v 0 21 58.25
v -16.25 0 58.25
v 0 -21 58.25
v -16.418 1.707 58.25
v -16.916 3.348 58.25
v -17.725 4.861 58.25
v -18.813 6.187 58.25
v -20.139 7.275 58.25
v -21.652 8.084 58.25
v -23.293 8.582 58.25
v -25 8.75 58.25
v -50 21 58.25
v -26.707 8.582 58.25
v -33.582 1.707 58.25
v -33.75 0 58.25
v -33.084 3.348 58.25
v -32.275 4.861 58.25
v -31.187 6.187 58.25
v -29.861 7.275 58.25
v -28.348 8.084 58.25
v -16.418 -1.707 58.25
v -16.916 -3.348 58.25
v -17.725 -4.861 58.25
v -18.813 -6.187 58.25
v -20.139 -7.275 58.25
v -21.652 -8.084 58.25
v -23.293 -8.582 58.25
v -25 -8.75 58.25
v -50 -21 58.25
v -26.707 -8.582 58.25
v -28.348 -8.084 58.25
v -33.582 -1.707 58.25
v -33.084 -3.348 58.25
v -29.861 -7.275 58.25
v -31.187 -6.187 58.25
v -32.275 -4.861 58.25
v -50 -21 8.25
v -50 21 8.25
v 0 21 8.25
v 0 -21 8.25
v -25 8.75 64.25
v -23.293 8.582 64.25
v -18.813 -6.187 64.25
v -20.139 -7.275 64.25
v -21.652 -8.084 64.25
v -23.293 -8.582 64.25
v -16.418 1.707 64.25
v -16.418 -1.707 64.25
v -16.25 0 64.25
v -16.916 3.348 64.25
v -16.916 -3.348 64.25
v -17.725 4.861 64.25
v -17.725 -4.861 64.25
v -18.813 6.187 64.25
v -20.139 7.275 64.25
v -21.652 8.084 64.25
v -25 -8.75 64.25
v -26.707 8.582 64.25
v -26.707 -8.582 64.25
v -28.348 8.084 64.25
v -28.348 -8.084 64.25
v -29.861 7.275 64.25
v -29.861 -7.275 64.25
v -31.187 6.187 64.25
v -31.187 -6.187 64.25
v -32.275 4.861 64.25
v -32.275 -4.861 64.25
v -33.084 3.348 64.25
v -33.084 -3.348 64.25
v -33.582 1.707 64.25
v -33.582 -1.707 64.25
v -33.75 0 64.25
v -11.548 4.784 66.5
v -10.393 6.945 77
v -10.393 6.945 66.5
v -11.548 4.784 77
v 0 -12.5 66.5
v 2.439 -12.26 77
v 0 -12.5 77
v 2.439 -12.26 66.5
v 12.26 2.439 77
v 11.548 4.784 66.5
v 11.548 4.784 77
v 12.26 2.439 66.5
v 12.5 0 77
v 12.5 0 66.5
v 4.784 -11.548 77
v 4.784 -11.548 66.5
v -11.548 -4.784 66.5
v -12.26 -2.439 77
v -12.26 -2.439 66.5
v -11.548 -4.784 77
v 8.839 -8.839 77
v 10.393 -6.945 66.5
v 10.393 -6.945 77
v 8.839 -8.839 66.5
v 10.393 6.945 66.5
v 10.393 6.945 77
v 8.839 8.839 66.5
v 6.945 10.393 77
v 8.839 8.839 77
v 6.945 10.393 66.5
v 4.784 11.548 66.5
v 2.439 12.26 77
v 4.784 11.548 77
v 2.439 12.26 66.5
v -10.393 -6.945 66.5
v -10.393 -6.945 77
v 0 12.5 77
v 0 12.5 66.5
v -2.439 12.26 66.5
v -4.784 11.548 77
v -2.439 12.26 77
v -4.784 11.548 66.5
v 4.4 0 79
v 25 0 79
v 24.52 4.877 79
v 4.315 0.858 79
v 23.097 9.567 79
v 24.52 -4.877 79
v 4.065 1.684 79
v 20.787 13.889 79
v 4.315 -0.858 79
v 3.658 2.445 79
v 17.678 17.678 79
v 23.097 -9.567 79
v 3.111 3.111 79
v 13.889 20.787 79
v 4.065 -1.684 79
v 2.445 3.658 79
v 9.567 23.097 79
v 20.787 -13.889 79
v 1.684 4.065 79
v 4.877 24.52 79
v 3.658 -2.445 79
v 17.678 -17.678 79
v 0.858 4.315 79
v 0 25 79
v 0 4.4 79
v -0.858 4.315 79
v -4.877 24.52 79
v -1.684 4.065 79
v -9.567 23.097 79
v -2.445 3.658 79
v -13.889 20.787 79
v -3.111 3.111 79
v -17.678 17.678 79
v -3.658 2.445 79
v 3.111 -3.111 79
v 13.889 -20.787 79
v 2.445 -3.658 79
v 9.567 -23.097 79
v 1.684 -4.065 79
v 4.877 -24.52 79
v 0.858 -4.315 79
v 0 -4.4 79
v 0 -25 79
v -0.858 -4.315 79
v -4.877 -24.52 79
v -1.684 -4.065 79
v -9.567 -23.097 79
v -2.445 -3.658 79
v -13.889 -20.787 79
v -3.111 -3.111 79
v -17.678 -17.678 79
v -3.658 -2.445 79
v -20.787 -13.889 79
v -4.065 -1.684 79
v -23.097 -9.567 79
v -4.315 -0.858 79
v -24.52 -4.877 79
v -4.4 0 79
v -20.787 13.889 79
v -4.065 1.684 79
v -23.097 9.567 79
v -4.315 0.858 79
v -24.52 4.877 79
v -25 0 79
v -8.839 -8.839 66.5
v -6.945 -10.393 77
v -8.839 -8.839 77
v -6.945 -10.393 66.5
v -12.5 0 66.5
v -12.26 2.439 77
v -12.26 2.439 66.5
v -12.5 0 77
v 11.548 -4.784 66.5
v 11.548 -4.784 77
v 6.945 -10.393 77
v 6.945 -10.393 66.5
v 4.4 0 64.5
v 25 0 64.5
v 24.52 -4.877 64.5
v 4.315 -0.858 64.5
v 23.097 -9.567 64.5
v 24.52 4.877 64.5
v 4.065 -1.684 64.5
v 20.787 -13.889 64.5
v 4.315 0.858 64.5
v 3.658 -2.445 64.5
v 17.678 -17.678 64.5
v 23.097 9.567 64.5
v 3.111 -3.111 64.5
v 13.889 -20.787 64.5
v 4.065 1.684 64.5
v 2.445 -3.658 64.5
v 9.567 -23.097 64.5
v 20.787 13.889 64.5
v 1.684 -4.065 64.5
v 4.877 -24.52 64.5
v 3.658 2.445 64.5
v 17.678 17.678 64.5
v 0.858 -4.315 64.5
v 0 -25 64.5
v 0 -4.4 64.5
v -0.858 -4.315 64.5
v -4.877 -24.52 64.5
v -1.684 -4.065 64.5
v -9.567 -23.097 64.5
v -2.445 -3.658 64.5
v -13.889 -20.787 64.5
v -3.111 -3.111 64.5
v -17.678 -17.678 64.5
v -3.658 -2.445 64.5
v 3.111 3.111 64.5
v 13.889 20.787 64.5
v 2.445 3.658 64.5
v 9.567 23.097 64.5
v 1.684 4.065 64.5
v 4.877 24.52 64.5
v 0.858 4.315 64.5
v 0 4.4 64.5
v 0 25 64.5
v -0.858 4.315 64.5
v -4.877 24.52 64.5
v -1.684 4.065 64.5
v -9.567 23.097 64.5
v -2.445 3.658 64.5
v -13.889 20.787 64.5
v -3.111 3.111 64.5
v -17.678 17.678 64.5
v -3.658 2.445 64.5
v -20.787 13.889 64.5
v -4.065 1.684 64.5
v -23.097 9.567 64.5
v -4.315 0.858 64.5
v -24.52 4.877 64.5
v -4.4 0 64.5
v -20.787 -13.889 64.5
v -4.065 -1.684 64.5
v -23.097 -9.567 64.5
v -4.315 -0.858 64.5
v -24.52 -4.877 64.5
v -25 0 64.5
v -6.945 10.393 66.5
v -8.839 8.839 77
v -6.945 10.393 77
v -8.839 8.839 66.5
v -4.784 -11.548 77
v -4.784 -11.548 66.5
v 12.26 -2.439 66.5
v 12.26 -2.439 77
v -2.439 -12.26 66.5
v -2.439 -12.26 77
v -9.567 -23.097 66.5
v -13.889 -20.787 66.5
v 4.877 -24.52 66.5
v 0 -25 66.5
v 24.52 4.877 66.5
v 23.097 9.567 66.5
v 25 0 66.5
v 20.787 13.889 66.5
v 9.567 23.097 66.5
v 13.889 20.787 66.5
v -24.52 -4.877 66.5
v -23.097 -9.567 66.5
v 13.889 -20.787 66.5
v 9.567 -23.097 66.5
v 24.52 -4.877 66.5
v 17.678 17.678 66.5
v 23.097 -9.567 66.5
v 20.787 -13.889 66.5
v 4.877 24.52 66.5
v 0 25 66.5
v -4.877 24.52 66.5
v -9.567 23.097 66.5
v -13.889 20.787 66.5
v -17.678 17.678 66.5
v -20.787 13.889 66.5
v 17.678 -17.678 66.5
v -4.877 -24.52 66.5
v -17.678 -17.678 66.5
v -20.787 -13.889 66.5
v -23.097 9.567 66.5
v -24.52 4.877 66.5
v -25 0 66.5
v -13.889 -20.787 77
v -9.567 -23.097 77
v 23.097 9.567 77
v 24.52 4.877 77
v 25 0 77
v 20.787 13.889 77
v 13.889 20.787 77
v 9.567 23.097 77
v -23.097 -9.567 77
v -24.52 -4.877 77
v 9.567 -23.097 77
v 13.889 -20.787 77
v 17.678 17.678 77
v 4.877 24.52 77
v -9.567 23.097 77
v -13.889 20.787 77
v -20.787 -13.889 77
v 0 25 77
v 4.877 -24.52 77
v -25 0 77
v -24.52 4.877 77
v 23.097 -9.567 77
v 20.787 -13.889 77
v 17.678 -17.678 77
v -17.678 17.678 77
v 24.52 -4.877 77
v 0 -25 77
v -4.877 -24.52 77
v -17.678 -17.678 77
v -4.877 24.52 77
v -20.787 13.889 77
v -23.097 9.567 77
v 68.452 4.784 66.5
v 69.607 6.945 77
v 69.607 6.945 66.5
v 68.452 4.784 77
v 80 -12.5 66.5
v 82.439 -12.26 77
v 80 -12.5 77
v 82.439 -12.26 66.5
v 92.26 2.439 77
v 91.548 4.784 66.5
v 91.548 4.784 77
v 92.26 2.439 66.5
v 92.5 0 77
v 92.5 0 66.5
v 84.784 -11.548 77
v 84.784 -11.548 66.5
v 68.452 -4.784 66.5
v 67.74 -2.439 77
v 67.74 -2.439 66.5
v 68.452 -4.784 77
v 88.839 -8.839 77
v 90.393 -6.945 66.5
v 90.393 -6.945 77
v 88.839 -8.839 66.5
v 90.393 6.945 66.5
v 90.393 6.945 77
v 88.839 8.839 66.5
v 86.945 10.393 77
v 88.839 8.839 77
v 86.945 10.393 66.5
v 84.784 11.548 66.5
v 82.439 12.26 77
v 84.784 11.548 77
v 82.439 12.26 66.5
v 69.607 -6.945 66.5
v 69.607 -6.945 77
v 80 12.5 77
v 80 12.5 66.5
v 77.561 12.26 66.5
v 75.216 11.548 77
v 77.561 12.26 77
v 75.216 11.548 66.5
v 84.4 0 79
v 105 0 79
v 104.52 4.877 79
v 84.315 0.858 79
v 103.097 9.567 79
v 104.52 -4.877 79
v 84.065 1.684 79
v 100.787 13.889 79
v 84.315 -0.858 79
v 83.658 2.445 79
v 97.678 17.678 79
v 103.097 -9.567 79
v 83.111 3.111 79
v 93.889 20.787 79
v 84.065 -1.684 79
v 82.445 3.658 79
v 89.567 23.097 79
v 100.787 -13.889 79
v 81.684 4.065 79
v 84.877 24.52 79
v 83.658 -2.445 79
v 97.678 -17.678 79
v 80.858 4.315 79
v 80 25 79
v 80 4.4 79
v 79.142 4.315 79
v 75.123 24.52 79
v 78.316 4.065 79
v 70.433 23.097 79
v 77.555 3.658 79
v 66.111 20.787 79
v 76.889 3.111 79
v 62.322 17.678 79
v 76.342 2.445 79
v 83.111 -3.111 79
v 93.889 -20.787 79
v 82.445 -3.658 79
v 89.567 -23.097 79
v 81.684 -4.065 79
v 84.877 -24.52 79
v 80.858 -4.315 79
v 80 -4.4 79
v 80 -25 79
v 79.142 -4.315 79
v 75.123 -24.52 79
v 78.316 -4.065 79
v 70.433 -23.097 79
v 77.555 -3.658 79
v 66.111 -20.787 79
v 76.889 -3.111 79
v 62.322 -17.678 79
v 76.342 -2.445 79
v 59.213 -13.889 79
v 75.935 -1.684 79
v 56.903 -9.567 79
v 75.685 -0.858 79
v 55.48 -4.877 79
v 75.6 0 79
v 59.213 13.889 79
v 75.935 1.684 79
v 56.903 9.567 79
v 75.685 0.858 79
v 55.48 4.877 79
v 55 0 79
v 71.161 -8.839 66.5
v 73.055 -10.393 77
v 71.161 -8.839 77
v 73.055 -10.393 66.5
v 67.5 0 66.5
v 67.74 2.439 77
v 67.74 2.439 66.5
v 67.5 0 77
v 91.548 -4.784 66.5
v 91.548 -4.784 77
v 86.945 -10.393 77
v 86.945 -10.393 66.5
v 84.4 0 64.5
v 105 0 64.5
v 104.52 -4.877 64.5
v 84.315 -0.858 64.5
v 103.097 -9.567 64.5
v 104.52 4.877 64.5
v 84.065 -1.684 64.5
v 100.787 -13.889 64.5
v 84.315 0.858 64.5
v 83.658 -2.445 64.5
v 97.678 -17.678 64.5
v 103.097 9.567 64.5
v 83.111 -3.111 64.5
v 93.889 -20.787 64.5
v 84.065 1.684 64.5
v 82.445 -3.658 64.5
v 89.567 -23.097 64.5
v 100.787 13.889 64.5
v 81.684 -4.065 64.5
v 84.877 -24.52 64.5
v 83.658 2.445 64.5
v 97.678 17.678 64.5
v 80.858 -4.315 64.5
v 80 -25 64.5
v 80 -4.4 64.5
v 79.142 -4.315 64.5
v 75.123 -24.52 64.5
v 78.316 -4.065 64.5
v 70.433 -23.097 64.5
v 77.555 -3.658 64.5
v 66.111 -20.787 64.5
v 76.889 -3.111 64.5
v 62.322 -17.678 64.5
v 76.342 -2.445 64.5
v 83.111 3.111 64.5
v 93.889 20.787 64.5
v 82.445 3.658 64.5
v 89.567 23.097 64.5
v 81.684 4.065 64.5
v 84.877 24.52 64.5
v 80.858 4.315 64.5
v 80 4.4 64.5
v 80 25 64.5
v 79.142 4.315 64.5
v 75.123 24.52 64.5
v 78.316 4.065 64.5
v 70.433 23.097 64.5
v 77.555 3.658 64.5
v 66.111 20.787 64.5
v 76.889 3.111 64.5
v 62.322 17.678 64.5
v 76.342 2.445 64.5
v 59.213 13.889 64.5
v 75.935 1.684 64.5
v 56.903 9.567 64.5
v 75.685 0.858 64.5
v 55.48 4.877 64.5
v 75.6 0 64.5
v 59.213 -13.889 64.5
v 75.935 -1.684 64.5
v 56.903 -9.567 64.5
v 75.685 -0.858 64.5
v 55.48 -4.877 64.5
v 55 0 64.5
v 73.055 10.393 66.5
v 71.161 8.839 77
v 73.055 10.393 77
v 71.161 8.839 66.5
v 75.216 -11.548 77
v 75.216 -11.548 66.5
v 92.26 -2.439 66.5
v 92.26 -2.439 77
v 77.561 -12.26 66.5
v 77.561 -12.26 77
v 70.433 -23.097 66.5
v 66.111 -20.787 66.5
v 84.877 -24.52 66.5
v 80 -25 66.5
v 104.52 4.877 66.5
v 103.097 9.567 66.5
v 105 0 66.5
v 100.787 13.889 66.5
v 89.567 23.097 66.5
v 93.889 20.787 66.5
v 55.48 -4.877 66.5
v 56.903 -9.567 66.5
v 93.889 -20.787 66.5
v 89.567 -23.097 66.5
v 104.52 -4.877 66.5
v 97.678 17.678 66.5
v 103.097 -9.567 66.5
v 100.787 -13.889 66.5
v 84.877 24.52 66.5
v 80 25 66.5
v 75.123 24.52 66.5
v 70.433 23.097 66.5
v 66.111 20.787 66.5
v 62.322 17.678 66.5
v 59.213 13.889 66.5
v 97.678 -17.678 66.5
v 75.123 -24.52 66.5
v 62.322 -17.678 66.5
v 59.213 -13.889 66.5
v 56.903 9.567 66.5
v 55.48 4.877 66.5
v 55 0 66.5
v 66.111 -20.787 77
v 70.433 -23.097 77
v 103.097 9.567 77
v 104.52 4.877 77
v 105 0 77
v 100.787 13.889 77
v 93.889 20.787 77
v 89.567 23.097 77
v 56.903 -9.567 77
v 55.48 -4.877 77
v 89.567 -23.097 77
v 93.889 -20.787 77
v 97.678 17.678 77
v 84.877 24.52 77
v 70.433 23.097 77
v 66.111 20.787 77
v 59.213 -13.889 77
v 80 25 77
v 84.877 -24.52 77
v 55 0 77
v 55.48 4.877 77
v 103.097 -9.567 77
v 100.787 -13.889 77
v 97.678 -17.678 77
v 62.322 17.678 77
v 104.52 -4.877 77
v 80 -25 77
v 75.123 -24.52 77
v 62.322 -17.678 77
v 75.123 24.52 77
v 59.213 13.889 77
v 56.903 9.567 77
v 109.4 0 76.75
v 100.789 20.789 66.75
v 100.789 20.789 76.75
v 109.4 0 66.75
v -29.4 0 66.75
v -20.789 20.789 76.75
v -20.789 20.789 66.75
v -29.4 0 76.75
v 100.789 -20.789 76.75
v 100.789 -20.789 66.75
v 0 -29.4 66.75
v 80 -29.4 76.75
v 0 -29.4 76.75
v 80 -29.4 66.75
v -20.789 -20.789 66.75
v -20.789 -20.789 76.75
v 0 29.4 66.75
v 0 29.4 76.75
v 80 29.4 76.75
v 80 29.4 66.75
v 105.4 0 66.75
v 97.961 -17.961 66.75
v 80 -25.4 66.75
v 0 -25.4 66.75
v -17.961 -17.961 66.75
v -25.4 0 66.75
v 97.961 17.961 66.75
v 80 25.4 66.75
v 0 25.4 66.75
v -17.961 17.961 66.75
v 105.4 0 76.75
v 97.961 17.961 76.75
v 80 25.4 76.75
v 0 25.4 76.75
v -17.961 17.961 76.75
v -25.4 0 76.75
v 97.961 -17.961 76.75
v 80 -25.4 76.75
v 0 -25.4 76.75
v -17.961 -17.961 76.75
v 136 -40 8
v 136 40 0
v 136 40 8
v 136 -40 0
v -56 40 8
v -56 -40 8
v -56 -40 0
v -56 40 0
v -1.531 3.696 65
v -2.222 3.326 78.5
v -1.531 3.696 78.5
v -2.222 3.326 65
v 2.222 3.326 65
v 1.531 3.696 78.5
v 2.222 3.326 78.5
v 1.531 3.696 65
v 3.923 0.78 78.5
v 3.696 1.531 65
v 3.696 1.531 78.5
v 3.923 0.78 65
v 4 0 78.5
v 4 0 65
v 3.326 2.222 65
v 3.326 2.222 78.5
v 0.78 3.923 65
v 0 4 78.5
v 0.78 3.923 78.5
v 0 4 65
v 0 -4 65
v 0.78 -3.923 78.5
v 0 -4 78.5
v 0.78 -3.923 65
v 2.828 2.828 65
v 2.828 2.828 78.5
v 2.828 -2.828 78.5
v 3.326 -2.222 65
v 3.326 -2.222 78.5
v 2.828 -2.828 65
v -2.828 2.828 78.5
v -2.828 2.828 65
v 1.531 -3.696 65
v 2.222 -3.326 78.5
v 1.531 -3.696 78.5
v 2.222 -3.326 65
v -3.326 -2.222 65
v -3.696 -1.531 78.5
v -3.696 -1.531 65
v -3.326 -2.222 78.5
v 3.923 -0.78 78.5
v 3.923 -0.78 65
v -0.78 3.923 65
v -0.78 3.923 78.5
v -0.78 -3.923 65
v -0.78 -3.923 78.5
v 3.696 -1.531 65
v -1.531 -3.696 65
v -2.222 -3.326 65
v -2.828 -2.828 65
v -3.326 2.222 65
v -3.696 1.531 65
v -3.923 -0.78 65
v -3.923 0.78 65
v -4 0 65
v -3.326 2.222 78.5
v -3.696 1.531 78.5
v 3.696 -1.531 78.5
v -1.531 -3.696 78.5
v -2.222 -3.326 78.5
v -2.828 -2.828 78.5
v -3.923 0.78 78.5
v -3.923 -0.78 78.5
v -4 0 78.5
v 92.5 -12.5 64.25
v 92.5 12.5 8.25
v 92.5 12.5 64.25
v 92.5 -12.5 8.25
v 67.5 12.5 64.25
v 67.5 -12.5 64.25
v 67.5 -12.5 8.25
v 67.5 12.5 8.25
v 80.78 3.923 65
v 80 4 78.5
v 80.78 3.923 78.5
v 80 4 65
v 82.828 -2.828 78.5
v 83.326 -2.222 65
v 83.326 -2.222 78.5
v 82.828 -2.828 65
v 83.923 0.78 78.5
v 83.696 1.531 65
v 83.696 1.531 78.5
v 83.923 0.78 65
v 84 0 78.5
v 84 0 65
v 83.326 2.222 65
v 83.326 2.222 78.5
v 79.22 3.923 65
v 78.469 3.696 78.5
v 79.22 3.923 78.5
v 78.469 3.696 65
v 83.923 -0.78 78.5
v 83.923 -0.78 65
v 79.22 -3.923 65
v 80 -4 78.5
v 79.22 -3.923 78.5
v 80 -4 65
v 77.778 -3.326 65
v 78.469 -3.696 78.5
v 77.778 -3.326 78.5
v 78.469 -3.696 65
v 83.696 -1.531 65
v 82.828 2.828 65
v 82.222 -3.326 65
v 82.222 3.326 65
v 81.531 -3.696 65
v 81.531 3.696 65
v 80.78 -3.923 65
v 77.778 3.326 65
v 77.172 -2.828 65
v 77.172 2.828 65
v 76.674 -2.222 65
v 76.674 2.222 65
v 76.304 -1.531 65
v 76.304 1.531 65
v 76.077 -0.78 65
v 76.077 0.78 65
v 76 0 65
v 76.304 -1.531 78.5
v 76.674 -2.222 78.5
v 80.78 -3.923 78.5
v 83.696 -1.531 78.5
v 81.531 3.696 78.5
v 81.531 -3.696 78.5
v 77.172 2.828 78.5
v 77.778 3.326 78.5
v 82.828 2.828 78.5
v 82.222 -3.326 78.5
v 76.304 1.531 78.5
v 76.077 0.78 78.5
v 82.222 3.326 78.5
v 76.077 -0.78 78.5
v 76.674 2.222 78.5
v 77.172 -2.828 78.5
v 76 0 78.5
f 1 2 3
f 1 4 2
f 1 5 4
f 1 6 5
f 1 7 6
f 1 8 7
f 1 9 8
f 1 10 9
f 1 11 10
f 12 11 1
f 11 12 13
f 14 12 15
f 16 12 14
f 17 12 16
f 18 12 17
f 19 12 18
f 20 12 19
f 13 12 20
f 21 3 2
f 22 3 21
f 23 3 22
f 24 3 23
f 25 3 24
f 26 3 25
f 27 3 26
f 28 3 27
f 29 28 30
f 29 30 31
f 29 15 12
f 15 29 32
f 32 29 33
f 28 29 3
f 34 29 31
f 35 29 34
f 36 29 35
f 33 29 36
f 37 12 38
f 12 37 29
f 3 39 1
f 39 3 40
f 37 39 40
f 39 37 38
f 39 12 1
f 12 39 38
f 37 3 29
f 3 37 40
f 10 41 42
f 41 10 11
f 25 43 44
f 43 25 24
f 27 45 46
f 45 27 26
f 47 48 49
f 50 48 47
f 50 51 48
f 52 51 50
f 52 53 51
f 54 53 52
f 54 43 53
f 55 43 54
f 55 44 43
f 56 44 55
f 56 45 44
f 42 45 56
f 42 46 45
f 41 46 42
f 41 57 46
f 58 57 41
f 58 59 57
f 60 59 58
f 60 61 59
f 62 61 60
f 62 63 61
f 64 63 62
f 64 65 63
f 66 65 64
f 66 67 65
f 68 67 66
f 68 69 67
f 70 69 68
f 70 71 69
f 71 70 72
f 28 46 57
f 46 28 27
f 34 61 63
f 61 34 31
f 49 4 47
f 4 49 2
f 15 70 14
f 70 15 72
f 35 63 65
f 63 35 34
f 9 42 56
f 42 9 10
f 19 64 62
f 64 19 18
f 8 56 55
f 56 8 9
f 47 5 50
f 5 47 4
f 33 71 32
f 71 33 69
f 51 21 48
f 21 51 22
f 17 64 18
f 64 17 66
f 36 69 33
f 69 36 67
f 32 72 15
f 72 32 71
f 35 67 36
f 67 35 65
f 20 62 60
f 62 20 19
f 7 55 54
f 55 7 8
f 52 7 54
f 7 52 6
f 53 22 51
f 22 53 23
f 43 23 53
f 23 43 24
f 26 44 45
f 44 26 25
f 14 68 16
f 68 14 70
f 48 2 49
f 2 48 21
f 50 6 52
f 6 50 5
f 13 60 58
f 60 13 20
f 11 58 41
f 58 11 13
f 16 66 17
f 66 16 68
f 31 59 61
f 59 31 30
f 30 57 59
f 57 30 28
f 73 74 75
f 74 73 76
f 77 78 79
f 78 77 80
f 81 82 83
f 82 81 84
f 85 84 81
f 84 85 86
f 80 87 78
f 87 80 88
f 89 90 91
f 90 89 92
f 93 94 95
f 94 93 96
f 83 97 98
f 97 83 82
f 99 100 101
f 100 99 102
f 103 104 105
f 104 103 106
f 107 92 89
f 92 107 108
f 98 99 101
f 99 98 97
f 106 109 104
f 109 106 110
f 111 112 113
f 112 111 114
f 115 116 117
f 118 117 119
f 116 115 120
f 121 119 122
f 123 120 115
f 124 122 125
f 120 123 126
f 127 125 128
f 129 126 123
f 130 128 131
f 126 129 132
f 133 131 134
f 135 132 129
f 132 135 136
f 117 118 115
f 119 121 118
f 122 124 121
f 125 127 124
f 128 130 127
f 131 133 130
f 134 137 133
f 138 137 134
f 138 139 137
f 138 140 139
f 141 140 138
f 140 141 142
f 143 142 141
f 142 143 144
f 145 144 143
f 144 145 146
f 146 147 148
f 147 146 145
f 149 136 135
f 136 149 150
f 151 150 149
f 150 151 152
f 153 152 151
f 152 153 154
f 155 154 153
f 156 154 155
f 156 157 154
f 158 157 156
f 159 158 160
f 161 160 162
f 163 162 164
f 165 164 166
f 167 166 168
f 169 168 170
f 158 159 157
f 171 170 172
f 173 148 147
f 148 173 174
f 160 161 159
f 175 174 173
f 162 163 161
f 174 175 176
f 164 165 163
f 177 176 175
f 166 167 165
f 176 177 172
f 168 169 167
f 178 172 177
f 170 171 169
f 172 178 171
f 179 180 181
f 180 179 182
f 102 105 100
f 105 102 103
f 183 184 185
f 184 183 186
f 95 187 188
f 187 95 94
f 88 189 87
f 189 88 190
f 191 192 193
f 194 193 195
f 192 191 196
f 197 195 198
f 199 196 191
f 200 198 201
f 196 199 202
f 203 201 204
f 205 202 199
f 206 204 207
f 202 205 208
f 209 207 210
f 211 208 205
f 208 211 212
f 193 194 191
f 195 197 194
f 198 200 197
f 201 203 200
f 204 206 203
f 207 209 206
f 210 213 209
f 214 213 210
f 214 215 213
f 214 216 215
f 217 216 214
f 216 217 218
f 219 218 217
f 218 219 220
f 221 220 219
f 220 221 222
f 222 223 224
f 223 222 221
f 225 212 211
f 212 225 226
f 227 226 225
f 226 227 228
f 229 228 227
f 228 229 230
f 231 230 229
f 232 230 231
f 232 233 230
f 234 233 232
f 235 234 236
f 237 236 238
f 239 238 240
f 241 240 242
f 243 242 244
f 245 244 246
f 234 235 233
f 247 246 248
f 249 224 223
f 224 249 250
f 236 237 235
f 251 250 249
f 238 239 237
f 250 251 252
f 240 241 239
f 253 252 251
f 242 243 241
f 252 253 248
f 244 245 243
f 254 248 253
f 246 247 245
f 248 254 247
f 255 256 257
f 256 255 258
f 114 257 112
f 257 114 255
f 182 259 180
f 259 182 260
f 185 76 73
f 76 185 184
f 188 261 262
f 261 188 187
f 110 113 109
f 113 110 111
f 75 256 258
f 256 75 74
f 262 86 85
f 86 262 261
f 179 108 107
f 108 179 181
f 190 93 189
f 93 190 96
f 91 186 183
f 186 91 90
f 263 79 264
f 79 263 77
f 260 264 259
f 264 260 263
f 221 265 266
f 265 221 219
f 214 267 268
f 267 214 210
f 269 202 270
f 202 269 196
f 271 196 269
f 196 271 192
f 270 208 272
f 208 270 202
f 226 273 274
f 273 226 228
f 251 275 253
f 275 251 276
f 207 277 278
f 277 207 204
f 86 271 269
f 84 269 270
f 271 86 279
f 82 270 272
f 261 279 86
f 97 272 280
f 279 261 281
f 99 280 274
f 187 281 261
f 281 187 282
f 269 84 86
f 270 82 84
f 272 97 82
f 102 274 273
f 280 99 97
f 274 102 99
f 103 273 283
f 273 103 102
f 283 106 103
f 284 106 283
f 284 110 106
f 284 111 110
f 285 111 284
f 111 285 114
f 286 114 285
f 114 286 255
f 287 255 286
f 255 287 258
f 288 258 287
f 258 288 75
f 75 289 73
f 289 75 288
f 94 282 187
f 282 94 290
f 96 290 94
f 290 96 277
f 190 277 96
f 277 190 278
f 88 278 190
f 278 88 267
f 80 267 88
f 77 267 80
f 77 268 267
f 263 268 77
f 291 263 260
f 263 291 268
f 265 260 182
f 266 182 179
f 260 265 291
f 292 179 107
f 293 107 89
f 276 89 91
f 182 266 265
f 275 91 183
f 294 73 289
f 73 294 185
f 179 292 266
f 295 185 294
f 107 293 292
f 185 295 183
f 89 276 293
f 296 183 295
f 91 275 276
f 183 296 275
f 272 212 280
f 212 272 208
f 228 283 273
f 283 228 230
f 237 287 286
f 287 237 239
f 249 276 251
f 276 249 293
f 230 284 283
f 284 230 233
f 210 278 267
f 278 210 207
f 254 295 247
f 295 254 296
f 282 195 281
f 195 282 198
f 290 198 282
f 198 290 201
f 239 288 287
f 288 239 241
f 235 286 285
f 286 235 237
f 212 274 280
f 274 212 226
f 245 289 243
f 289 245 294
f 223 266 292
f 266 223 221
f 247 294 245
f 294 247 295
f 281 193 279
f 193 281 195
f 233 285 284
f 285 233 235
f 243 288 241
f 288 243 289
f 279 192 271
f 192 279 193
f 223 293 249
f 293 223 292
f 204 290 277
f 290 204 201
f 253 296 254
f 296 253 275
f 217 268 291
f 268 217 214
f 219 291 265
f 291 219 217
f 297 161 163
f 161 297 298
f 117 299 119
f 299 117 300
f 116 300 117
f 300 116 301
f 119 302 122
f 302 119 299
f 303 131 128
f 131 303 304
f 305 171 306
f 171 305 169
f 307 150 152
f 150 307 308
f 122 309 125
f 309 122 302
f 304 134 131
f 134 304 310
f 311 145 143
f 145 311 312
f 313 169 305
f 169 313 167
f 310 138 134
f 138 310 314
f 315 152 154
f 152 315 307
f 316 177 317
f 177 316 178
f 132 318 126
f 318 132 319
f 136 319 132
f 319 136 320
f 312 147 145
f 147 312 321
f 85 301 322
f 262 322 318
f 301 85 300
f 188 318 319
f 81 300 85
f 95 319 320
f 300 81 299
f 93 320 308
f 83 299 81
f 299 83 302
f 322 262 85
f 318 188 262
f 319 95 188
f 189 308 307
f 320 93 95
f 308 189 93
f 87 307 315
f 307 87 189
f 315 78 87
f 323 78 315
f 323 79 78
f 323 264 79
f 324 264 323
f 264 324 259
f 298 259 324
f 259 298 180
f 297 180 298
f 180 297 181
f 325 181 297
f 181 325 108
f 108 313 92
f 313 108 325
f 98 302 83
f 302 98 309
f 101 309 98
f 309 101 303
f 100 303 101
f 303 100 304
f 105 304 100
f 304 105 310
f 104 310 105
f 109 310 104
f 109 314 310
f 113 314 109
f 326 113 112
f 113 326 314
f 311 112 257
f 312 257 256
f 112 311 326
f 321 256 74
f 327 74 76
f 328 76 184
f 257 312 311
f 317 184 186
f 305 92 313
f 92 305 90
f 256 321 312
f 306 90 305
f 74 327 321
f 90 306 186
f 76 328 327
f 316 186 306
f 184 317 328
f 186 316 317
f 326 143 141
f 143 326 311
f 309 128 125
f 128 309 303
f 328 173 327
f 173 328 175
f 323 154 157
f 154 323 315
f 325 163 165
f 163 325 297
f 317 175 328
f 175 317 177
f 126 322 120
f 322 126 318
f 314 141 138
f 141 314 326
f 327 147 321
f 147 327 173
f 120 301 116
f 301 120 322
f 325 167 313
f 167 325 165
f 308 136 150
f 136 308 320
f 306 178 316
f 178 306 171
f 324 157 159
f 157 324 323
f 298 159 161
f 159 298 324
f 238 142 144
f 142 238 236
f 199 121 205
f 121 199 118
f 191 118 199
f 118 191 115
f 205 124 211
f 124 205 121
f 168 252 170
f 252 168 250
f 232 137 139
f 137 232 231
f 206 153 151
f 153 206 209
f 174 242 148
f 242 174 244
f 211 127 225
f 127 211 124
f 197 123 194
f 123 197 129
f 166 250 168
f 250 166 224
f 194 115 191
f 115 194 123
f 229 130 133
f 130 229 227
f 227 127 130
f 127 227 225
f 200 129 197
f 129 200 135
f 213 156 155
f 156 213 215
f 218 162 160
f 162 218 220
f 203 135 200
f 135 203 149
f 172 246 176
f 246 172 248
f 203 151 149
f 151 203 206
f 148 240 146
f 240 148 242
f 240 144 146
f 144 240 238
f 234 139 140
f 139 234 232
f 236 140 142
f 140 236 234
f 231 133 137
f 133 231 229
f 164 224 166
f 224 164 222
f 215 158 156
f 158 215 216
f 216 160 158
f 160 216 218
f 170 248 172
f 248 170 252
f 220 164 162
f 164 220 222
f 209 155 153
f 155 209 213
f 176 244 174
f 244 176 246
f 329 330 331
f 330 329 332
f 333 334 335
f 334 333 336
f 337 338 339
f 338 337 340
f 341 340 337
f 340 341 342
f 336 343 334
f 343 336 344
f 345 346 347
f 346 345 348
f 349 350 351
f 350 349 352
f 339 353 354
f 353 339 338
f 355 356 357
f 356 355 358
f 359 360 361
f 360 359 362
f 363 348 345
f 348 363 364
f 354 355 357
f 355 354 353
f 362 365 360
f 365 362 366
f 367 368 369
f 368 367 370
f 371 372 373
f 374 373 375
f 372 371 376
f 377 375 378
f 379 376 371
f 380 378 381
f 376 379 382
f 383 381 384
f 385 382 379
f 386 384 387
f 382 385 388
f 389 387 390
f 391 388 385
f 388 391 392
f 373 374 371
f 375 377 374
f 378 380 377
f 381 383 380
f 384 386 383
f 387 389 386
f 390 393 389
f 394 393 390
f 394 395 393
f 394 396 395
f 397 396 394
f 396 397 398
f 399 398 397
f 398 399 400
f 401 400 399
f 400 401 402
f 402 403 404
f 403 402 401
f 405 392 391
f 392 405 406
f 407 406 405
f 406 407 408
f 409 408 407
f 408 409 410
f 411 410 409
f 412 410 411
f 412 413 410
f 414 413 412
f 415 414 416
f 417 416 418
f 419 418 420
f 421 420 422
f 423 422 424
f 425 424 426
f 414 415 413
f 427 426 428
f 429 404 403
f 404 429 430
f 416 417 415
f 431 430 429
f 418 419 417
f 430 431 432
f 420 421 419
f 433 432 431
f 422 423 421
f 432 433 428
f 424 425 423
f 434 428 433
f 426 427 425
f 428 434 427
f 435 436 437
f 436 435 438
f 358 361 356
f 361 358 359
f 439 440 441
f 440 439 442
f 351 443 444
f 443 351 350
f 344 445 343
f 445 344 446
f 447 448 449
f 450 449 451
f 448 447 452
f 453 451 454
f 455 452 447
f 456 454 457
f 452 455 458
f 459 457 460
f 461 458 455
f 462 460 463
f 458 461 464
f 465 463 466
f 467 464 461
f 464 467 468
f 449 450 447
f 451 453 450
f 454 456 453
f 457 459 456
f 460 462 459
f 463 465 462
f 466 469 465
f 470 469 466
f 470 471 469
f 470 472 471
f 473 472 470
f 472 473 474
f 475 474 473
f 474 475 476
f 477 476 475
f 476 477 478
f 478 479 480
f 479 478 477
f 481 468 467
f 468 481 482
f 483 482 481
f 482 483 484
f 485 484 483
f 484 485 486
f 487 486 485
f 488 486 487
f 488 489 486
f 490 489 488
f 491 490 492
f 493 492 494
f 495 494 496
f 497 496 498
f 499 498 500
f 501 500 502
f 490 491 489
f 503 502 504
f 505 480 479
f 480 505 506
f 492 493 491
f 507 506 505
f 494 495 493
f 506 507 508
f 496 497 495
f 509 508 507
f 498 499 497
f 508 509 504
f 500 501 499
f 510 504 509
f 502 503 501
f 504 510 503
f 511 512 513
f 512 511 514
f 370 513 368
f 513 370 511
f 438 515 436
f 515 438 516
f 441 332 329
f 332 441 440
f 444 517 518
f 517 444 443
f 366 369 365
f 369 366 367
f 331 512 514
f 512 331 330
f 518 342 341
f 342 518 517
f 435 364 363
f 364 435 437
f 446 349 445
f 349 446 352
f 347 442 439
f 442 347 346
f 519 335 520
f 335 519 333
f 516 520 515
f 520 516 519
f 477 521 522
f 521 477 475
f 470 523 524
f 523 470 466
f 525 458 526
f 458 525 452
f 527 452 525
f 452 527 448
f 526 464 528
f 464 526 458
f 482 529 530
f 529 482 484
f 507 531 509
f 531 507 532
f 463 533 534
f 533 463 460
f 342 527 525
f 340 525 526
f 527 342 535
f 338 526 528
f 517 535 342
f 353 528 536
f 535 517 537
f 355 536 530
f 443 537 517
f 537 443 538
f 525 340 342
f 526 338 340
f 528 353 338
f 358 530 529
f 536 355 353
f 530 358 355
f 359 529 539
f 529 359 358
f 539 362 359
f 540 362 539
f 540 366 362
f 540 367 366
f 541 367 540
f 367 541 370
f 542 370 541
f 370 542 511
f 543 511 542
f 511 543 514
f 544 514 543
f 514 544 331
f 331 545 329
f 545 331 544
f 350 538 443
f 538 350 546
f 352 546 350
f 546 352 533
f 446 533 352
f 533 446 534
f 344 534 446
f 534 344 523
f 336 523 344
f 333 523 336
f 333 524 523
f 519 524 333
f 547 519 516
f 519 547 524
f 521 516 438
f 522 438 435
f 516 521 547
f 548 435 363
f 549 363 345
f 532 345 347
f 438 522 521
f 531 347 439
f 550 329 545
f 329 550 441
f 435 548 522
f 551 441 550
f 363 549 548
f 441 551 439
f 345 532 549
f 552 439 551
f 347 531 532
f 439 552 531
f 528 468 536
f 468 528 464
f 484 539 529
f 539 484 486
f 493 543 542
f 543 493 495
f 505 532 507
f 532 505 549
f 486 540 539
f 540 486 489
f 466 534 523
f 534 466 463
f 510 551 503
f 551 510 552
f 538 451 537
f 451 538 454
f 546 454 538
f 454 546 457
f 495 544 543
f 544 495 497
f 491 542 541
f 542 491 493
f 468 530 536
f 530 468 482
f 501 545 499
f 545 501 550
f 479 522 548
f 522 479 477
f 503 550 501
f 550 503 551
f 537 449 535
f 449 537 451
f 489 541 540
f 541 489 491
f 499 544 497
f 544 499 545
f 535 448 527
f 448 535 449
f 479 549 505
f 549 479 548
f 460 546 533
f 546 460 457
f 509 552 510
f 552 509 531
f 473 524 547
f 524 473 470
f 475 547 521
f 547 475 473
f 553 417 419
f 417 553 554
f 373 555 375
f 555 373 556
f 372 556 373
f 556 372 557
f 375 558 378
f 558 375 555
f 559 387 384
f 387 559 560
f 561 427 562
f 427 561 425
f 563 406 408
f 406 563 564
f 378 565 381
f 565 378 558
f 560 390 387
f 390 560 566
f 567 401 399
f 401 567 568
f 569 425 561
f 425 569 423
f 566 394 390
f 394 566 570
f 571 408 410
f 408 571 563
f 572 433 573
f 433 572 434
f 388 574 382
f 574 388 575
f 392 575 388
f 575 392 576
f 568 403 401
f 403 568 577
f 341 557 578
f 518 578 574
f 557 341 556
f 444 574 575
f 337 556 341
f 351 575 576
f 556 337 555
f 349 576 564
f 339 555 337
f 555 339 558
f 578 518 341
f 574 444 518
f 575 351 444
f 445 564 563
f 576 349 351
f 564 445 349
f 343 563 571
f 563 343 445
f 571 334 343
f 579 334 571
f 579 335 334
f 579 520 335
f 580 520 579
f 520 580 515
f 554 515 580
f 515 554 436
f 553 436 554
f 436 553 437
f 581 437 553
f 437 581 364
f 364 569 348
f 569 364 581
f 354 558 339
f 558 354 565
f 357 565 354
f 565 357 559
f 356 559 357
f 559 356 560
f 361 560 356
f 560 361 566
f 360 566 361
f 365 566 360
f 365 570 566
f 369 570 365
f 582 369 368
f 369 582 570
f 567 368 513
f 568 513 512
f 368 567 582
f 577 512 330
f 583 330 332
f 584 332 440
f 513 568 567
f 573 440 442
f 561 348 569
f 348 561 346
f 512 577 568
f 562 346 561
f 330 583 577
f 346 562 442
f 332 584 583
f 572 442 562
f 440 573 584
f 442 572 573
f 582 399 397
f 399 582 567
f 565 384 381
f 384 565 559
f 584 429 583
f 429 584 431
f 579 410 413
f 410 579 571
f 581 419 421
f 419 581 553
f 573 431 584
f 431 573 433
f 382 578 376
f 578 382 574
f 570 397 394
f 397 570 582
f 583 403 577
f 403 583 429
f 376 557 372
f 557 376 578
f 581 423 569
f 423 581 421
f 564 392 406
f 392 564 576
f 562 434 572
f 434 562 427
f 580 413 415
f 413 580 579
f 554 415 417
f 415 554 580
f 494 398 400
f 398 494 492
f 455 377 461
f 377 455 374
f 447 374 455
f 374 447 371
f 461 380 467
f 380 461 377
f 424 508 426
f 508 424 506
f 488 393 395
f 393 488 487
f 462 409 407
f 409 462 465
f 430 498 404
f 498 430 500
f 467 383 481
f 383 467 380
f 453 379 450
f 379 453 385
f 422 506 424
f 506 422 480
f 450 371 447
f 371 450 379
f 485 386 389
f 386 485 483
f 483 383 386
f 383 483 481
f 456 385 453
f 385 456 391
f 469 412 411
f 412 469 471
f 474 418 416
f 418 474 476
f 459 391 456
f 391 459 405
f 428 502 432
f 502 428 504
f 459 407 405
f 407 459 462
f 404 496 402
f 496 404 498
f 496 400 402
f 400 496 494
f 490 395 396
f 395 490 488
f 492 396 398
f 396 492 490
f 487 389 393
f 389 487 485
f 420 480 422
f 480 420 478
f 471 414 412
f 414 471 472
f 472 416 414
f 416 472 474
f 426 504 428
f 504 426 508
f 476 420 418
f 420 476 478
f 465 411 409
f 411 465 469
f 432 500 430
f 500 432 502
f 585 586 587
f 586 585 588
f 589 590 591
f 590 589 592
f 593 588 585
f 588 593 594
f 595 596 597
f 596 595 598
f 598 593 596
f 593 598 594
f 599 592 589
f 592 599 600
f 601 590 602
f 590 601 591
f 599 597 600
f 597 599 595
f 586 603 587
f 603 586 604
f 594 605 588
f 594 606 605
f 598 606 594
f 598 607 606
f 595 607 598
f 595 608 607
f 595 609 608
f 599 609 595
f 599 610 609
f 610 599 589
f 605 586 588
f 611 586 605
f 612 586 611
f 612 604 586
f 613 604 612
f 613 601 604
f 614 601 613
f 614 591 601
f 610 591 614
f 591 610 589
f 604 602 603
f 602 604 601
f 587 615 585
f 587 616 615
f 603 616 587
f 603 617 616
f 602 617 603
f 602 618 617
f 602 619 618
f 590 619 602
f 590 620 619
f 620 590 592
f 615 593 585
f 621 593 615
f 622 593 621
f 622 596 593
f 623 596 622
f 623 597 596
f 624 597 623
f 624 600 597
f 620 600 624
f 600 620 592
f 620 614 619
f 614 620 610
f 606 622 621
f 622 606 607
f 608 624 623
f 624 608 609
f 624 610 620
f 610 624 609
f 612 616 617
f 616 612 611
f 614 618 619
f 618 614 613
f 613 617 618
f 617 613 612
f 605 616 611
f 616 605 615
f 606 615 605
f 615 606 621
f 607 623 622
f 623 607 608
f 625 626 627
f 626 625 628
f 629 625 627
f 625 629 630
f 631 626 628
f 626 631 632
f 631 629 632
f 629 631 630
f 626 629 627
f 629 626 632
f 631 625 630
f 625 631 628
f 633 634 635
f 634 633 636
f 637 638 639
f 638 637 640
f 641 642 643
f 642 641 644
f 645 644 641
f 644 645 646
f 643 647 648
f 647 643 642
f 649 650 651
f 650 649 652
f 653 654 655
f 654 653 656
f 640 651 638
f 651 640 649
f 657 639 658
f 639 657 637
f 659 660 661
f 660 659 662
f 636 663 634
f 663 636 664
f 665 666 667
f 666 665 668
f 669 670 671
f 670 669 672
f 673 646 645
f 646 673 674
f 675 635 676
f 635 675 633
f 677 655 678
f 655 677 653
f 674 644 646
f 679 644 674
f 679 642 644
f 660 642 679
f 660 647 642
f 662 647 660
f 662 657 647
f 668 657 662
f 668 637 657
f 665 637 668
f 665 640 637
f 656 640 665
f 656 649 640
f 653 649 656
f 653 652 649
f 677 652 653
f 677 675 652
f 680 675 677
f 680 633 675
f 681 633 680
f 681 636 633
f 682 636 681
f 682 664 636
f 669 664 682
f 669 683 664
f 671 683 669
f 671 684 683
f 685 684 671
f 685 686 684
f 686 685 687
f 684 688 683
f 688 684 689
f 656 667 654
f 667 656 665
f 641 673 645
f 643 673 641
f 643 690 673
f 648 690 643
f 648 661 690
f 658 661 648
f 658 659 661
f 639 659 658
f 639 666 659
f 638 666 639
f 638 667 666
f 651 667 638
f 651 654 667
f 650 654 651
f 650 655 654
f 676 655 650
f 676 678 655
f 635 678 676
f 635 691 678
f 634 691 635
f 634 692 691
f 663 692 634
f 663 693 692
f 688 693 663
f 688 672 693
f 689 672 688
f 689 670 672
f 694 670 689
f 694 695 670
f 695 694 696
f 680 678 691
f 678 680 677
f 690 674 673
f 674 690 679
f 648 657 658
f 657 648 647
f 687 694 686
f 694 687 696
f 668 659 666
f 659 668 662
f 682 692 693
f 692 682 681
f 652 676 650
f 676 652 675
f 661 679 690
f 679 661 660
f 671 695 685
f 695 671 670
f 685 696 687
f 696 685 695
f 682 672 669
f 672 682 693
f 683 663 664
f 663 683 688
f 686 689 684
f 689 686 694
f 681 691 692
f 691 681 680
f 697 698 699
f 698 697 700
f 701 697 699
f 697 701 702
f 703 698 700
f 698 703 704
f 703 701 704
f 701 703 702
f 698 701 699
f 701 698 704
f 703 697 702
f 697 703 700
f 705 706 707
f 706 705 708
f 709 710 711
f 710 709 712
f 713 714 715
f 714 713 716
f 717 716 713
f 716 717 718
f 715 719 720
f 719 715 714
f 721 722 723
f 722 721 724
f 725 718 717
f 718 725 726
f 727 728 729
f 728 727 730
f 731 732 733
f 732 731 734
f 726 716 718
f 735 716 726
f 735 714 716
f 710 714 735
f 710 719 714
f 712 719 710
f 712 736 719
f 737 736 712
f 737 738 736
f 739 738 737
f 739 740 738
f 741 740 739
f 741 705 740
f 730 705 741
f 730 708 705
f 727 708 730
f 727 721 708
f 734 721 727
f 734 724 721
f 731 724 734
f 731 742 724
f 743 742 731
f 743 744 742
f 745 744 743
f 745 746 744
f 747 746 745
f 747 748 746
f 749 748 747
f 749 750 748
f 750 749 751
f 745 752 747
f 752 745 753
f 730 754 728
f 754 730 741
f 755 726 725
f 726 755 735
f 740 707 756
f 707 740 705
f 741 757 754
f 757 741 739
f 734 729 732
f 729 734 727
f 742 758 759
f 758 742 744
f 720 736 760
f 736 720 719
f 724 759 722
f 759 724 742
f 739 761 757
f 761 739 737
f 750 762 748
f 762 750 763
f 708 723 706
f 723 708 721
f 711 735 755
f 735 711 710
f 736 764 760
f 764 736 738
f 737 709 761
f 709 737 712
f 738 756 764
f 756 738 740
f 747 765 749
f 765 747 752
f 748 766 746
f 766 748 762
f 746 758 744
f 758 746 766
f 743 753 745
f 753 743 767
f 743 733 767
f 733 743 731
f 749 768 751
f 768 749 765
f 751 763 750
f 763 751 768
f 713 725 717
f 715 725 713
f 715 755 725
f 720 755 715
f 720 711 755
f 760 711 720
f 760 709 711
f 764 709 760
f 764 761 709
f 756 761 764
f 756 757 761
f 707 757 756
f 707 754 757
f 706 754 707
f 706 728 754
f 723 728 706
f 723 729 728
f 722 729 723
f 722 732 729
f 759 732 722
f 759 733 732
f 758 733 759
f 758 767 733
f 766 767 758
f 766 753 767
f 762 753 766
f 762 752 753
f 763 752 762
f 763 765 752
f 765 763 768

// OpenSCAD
$fn = 32;

// ------------------------------------------------------------------------
// Motor belt drive: span 80 mm, pulleys d50, belt 10 mm wide
// Every part is its own module, assembly() places every instance.
// ------------------------------------------------------------------------

// --- part 1 ---
module base_plate() {
  difference() {
    translate([-96, -40, 0]) cube([192, 80, 8]);
  }
}

// --- part 2 ---
module motor() {
  union() {
    translate([-25, -21, 0]) cube([50, 42, 50]);
    translate([28, 0, 25]) rotate([0, 90, 0]) cylinder(h = 6, d = 17.5, center = true);
  }
}

// --- part 3 ---
module drive_shaft() {
  translate([0, 0, -6.75]) cylinder(h = 13.5, d = 8);
}

// --- part 4 ---
module pulley_drive() {
  difference() {
    union() {
      cylinder(h = 14.5, d = 25);
      cylinder(h = 2, d = 50);
      translate([0, 0, 12.5]) cylinder(h = 2, d = 50);
    }
    translate([0, 0, -1]) cylinder(h = 16.5, d = 8.8);
  }
}

// --- part 5 ---
module idler_post() {
  translate([-12.5, -12.5, 0]) cube([25, 25, 56]);
}

// --- part 6 ---
module driven_shaft() {
  translate([0, 0, -6.75]) cylinder(h = 13.5, d = 8);
}

// --- part 7 ---
module pulley_driven() {
  difference() {
    union() {
      cylinder(h = 14.5, d = 25);
      cylinder(h = 2, d = 50);
      translate([0, 0, 12.5]) cylinder(h = 2, d = 50);
    }
    translate([0, 0, -1]) cylinder(h = 16.5, d = 8.8);
  }
}

// --- part 8 ---
module drive_belt() {
  difference() {
    linear_extrude(height = 10) polygon(points = concat([for (a = [90 : 45 : 270]) [29.4 * cos(a), 29.4 * sin(a)]], [for (a = [270 : 45 : 450]) [80 + 29.4 * cos(a), 29.4 * sin(a)]]));
    translate([0, 0, -1]) linear_extrude(height = 12) polygon(points = concat([for (a = [90 : 45 : 270]) [25.4 * cos(a), 25.4 * sin(a)]], [for (a = [270 : 45 : 450]) [80 + 25.4 * cos(a), 25.4 * sin(a)]]));
  }
}

// --- assembly ---
module assembly() {
  color([0.80, 0.24, 0.20]) translate([40, 0, 0]) rotate([0, 0, 0]) base_plate();
  color([0.20, 0.45, 0.75]) translate([0, 0, 33.25]) rotate([0, 270, 0]) motor();
  color([0.25, 0.62, 0.32]) translate([0, 0, 71.75]) rotate([0, 0, 0]) drive_shaft();
  color([0.92, 0.70, 0.18]) translate([0, 0, 64.5]) rotate([0, 0, 0]) pulley_drive();
  color([0.58, 0.35, 0.70]) translate([80, 0, 8.25]) rotate([0, 0, 0]) idler_post();
  color([0.16, 0.66, 0.66]) translate([80, 0, 71.75]) rotate([0, 0, 0]) driven_shaft();
  color([0.85, 0.48, 0.18]) translate([80, 0, 64.5]) rotate([0, 0, 0]) pulley_driven();
  color([0.55, 0.60, 0.65]) translate([0, 0, 66.75]) rotate([0, 0, 0]) drive_belt();
}

assembly();
